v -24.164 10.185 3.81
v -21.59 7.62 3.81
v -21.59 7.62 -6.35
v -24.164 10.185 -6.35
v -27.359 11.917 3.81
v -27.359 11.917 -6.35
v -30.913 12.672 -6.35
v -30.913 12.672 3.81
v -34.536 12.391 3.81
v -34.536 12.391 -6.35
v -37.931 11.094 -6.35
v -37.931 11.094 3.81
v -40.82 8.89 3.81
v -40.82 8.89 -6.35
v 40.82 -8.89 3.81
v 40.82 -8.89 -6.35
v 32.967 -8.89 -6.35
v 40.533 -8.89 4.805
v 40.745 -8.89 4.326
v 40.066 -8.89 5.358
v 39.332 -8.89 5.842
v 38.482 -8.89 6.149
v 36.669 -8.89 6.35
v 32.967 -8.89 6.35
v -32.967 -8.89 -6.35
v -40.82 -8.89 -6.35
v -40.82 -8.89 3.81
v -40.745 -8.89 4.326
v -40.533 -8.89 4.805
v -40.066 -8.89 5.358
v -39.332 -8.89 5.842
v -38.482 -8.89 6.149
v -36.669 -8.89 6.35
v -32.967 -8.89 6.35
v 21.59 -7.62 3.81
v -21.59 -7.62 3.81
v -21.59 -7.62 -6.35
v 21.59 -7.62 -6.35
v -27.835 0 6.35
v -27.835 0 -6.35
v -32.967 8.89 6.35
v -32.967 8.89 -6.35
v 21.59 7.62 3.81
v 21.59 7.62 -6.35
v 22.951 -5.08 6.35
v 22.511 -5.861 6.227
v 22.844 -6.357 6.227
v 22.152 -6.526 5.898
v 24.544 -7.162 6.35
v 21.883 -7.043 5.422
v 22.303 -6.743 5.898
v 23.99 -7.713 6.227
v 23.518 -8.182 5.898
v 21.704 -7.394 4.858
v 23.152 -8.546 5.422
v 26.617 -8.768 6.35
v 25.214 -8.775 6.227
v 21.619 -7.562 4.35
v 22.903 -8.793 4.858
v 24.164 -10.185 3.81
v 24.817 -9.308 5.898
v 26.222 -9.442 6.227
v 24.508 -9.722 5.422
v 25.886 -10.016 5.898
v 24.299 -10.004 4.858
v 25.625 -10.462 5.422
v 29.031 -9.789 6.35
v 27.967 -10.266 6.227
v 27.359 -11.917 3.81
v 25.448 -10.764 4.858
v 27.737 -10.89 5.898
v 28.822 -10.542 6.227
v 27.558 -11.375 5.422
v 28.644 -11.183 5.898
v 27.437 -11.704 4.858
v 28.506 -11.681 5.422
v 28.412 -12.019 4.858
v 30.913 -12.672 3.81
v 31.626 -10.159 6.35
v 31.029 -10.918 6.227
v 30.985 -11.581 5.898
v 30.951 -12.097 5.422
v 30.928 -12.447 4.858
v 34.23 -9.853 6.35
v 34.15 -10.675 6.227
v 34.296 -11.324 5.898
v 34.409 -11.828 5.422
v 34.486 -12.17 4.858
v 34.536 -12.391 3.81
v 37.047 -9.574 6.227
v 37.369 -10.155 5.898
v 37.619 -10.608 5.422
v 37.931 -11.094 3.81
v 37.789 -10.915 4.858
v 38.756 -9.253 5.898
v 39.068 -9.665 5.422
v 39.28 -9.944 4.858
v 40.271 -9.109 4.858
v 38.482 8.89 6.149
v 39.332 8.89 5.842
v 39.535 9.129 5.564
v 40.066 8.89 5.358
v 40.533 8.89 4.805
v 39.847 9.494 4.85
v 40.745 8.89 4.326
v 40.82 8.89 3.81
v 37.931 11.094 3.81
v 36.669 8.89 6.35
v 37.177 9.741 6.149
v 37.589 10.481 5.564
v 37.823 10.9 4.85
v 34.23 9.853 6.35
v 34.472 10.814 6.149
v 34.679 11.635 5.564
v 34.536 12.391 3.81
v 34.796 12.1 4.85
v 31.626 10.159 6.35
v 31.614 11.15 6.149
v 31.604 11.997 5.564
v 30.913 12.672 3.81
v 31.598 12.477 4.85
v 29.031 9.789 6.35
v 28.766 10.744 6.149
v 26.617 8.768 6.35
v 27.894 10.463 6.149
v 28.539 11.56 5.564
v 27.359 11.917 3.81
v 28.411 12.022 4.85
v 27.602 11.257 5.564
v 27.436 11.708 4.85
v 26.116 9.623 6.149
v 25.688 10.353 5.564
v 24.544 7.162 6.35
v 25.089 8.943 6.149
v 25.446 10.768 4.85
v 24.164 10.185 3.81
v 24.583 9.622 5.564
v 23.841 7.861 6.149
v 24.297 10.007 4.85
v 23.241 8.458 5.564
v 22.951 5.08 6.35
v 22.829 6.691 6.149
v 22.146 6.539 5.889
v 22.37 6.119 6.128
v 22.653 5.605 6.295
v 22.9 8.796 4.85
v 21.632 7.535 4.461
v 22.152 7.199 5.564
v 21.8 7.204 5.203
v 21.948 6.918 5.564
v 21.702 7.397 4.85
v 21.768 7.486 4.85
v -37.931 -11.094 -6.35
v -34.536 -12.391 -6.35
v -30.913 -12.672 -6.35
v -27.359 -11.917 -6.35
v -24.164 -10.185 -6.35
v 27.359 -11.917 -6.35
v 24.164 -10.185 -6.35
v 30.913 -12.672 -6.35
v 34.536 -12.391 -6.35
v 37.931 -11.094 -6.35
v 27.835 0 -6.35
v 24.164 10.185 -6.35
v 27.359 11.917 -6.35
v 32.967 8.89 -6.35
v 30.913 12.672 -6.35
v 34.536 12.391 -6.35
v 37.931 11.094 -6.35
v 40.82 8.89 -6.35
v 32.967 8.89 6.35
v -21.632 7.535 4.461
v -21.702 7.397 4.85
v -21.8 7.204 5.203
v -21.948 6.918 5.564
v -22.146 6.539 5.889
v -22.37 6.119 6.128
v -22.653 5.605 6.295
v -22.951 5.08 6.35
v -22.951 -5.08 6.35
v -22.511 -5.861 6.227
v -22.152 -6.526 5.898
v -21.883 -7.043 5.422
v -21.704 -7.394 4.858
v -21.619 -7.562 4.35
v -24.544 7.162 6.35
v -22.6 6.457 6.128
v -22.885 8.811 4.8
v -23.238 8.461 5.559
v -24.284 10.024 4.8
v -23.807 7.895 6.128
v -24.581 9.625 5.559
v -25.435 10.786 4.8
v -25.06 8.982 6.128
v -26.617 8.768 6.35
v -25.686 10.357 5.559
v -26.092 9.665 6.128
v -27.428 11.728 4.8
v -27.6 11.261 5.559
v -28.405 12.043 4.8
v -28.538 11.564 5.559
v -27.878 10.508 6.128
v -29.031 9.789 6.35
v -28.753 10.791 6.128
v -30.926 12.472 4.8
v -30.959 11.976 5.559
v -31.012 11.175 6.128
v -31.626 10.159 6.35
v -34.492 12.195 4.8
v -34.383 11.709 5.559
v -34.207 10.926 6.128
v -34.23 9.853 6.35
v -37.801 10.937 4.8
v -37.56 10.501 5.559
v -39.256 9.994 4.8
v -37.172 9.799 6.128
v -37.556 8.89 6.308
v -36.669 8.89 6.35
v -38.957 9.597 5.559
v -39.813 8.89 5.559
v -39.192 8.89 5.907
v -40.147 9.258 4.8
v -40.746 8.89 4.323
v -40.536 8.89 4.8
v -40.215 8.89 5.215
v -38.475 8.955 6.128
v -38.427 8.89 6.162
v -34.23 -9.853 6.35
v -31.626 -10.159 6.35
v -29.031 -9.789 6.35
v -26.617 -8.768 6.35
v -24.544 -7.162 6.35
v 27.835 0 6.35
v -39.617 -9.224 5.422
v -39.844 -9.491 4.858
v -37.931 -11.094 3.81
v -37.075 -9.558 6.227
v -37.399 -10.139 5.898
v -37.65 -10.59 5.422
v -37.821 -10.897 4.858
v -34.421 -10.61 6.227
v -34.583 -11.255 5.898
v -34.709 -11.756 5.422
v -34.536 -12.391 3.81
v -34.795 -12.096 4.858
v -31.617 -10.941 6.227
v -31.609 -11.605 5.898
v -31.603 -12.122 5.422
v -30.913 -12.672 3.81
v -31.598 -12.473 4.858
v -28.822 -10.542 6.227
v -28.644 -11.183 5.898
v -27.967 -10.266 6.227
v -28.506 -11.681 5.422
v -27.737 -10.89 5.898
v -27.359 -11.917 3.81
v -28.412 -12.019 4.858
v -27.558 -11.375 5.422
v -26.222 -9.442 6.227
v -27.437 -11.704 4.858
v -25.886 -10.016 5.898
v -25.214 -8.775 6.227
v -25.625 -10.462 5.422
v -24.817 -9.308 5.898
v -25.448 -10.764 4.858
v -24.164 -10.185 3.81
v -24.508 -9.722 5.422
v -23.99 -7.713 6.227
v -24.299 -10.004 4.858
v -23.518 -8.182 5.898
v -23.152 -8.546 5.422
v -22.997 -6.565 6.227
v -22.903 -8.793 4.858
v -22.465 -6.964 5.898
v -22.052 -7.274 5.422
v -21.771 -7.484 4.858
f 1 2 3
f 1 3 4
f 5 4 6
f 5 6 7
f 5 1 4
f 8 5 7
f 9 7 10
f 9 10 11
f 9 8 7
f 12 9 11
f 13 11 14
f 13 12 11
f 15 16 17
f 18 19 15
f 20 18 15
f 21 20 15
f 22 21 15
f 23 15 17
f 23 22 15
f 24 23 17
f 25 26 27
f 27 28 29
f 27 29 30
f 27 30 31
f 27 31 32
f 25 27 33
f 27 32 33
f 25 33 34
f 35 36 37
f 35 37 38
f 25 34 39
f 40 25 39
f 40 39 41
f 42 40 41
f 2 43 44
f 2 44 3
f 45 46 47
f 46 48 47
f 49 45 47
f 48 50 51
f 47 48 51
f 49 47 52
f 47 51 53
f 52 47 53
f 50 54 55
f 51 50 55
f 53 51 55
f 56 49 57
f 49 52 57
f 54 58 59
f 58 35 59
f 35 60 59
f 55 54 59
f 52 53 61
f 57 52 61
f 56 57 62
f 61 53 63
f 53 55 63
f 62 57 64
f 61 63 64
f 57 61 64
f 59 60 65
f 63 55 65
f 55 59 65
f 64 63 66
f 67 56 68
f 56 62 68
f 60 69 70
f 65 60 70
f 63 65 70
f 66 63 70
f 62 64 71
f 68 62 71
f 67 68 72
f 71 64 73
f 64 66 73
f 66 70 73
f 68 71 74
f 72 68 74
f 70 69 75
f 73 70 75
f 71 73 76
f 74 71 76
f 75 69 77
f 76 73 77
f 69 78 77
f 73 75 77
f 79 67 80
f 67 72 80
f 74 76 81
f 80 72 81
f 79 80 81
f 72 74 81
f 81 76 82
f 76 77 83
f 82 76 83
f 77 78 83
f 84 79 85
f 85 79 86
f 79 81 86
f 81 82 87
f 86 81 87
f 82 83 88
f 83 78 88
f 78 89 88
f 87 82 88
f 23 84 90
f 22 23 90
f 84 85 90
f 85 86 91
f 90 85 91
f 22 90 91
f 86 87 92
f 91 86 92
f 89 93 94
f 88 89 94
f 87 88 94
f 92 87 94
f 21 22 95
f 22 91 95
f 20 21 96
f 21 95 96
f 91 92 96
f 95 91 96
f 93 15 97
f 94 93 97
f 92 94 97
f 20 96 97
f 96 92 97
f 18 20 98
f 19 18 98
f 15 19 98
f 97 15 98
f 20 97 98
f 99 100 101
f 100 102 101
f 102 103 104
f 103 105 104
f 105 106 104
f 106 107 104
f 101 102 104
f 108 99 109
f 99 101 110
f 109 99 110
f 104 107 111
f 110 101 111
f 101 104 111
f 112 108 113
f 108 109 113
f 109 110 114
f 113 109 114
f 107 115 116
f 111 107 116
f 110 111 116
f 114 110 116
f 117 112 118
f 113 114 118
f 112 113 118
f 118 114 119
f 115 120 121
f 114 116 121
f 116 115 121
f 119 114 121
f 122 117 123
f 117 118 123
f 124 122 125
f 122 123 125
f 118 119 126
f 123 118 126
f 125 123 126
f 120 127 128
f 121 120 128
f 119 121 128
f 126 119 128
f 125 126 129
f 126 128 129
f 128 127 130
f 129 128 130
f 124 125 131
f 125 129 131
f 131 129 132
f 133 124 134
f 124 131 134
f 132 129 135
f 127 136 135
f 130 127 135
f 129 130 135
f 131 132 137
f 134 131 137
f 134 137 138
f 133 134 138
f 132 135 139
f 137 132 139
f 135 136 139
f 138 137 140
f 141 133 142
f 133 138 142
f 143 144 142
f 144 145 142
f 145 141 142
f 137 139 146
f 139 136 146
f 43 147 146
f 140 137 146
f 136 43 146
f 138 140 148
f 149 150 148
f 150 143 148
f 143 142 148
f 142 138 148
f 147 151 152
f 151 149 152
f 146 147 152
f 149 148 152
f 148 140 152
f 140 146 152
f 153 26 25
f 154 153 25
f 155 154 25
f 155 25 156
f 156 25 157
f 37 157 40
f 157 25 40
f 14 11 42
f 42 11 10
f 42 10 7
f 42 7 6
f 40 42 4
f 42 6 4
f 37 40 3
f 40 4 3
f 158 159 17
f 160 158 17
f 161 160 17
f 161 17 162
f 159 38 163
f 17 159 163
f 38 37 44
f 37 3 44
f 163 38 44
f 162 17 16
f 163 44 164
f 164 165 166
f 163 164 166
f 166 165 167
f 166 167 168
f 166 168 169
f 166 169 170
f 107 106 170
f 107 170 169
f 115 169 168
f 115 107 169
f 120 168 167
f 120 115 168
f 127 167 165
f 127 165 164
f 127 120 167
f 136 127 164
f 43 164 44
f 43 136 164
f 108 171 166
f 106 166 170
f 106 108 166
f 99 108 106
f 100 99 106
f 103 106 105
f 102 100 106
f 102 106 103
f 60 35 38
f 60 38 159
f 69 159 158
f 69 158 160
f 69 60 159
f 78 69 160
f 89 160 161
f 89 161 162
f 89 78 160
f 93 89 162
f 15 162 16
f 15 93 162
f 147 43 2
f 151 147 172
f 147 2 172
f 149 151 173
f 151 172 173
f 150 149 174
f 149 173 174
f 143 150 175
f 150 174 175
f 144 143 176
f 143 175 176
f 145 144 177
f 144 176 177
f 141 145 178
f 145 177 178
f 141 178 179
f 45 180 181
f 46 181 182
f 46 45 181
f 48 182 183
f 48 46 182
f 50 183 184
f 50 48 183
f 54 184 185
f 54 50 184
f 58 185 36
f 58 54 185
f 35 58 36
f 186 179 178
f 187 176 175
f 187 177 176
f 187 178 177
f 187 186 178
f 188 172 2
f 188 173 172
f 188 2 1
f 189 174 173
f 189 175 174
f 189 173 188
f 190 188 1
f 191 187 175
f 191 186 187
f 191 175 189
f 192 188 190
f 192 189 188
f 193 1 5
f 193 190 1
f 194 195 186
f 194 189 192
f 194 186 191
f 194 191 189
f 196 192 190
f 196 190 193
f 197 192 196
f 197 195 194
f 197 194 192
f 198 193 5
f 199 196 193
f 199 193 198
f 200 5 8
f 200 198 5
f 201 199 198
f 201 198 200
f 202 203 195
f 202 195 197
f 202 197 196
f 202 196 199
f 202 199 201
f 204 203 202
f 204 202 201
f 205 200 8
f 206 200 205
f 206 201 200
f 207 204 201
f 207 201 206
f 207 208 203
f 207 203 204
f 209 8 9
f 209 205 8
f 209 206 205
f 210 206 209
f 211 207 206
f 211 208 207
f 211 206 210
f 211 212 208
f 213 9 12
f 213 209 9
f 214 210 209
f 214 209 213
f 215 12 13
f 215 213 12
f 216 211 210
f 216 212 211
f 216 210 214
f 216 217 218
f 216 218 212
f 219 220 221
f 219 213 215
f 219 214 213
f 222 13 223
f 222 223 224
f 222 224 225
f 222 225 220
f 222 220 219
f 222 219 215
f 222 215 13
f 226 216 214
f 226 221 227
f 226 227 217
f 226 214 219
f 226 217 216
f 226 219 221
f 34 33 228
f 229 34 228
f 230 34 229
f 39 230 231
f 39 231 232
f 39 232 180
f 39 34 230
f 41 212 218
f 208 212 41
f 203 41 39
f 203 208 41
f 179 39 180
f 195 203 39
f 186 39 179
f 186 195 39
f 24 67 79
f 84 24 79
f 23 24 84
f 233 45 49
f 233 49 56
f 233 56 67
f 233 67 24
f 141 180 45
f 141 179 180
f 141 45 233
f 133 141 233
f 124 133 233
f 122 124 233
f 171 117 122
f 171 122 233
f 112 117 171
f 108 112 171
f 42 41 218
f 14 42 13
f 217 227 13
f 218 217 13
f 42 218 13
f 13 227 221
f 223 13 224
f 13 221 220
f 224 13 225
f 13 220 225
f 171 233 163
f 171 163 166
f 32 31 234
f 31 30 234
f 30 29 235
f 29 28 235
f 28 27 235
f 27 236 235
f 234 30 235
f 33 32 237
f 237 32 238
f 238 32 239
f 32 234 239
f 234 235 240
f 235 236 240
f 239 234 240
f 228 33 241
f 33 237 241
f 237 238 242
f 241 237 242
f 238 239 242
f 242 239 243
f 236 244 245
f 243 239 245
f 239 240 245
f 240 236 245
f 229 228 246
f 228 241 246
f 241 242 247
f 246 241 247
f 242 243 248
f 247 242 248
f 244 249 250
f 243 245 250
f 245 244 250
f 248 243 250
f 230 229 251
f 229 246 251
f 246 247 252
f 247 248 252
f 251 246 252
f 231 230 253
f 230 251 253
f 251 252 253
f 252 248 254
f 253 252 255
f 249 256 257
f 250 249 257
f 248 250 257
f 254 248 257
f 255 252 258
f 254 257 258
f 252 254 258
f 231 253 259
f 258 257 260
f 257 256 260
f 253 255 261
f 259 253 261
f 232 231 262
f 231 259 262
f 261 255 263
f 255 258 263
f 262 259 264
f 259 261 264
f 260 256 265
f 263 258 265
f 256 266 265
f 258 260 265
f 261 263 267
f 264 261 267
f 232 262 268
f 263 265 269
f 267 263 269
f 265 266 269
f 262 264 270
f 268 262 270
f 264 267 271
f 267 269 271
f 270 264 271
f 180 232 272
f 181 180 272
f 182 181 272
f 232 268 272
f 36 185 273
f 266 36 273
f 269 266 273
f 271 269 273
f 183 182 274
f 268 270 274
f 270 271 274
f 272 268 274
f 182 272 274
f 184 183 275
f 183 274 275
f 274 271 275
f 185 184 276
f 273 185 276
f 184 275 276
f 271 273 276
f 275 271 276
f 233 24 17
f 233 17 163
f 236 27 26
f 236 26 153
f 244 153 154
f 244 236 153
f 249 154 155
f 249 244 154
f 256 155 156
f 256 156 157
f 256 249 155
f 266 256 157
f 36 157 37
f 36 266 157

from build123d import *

# Parameters (mm, degrees)
F1_DEPTH = 6.35
F3_DEPTH = 12.701
F6_R     = 2.54


with BuildPart() as f1:
    # F0 (on Top) → F1 (new body, symmetric)
    with BuildSketch(Plane.XY):
        with BuildLine():
            Line((21.59, 7.62), (-21.59, 7.62))
            ThreePointArc((-21.59, 7.62), (-44.45, 0), (-21.59, -7.62))
            Line((-21.59, -7.62), (21.59, -7.62))
            ThreePointArc((21.59, -7.62), (44.45, 0), (21.59, 7.62))
        make_face()
    extrude(amount=F1_DEPTH, both=True)

    # F4: F3 across plane


with BuildPart() as f3:
    # F2 (on face) → F3 (new body, through all)
    with BuildSketch(Plane.XY.offset(6.35)):
        Polygon((-48.365288, 0), (-43.232644, -8.89), (-32.967356, -8.89), (-27.834712, 0), (-32.967356, 8.89), (-43.232644, 8.89), align=None)
    extrude(amount=-F3_DEPTH)


with BuildPart() as f1_1:
    add(f1.part)
    add(f3.part.mirror(Plane.YZ), mode=Mode.SUBTRACT)

    # F5: cut F3
    add(f3.part, mode=Mode.SUBTRACT)

    # F6
    f6_edges = [f1_1.edges().sort_by_distance(p)[0] for p in [
        (0, -7.62, 6.35),
        (-30.913065, 12.672393, 6.35),
        (-30.913065, -12.672393, 6.35),
        (0, 7.62, 6.35),
        (30.913065, -12.672393, 6.35),
        (30.913065, 12.672393, 6.35),
    ]]
    fillet(f6_edges, radius=F6_R)


solid = f1_1.part
